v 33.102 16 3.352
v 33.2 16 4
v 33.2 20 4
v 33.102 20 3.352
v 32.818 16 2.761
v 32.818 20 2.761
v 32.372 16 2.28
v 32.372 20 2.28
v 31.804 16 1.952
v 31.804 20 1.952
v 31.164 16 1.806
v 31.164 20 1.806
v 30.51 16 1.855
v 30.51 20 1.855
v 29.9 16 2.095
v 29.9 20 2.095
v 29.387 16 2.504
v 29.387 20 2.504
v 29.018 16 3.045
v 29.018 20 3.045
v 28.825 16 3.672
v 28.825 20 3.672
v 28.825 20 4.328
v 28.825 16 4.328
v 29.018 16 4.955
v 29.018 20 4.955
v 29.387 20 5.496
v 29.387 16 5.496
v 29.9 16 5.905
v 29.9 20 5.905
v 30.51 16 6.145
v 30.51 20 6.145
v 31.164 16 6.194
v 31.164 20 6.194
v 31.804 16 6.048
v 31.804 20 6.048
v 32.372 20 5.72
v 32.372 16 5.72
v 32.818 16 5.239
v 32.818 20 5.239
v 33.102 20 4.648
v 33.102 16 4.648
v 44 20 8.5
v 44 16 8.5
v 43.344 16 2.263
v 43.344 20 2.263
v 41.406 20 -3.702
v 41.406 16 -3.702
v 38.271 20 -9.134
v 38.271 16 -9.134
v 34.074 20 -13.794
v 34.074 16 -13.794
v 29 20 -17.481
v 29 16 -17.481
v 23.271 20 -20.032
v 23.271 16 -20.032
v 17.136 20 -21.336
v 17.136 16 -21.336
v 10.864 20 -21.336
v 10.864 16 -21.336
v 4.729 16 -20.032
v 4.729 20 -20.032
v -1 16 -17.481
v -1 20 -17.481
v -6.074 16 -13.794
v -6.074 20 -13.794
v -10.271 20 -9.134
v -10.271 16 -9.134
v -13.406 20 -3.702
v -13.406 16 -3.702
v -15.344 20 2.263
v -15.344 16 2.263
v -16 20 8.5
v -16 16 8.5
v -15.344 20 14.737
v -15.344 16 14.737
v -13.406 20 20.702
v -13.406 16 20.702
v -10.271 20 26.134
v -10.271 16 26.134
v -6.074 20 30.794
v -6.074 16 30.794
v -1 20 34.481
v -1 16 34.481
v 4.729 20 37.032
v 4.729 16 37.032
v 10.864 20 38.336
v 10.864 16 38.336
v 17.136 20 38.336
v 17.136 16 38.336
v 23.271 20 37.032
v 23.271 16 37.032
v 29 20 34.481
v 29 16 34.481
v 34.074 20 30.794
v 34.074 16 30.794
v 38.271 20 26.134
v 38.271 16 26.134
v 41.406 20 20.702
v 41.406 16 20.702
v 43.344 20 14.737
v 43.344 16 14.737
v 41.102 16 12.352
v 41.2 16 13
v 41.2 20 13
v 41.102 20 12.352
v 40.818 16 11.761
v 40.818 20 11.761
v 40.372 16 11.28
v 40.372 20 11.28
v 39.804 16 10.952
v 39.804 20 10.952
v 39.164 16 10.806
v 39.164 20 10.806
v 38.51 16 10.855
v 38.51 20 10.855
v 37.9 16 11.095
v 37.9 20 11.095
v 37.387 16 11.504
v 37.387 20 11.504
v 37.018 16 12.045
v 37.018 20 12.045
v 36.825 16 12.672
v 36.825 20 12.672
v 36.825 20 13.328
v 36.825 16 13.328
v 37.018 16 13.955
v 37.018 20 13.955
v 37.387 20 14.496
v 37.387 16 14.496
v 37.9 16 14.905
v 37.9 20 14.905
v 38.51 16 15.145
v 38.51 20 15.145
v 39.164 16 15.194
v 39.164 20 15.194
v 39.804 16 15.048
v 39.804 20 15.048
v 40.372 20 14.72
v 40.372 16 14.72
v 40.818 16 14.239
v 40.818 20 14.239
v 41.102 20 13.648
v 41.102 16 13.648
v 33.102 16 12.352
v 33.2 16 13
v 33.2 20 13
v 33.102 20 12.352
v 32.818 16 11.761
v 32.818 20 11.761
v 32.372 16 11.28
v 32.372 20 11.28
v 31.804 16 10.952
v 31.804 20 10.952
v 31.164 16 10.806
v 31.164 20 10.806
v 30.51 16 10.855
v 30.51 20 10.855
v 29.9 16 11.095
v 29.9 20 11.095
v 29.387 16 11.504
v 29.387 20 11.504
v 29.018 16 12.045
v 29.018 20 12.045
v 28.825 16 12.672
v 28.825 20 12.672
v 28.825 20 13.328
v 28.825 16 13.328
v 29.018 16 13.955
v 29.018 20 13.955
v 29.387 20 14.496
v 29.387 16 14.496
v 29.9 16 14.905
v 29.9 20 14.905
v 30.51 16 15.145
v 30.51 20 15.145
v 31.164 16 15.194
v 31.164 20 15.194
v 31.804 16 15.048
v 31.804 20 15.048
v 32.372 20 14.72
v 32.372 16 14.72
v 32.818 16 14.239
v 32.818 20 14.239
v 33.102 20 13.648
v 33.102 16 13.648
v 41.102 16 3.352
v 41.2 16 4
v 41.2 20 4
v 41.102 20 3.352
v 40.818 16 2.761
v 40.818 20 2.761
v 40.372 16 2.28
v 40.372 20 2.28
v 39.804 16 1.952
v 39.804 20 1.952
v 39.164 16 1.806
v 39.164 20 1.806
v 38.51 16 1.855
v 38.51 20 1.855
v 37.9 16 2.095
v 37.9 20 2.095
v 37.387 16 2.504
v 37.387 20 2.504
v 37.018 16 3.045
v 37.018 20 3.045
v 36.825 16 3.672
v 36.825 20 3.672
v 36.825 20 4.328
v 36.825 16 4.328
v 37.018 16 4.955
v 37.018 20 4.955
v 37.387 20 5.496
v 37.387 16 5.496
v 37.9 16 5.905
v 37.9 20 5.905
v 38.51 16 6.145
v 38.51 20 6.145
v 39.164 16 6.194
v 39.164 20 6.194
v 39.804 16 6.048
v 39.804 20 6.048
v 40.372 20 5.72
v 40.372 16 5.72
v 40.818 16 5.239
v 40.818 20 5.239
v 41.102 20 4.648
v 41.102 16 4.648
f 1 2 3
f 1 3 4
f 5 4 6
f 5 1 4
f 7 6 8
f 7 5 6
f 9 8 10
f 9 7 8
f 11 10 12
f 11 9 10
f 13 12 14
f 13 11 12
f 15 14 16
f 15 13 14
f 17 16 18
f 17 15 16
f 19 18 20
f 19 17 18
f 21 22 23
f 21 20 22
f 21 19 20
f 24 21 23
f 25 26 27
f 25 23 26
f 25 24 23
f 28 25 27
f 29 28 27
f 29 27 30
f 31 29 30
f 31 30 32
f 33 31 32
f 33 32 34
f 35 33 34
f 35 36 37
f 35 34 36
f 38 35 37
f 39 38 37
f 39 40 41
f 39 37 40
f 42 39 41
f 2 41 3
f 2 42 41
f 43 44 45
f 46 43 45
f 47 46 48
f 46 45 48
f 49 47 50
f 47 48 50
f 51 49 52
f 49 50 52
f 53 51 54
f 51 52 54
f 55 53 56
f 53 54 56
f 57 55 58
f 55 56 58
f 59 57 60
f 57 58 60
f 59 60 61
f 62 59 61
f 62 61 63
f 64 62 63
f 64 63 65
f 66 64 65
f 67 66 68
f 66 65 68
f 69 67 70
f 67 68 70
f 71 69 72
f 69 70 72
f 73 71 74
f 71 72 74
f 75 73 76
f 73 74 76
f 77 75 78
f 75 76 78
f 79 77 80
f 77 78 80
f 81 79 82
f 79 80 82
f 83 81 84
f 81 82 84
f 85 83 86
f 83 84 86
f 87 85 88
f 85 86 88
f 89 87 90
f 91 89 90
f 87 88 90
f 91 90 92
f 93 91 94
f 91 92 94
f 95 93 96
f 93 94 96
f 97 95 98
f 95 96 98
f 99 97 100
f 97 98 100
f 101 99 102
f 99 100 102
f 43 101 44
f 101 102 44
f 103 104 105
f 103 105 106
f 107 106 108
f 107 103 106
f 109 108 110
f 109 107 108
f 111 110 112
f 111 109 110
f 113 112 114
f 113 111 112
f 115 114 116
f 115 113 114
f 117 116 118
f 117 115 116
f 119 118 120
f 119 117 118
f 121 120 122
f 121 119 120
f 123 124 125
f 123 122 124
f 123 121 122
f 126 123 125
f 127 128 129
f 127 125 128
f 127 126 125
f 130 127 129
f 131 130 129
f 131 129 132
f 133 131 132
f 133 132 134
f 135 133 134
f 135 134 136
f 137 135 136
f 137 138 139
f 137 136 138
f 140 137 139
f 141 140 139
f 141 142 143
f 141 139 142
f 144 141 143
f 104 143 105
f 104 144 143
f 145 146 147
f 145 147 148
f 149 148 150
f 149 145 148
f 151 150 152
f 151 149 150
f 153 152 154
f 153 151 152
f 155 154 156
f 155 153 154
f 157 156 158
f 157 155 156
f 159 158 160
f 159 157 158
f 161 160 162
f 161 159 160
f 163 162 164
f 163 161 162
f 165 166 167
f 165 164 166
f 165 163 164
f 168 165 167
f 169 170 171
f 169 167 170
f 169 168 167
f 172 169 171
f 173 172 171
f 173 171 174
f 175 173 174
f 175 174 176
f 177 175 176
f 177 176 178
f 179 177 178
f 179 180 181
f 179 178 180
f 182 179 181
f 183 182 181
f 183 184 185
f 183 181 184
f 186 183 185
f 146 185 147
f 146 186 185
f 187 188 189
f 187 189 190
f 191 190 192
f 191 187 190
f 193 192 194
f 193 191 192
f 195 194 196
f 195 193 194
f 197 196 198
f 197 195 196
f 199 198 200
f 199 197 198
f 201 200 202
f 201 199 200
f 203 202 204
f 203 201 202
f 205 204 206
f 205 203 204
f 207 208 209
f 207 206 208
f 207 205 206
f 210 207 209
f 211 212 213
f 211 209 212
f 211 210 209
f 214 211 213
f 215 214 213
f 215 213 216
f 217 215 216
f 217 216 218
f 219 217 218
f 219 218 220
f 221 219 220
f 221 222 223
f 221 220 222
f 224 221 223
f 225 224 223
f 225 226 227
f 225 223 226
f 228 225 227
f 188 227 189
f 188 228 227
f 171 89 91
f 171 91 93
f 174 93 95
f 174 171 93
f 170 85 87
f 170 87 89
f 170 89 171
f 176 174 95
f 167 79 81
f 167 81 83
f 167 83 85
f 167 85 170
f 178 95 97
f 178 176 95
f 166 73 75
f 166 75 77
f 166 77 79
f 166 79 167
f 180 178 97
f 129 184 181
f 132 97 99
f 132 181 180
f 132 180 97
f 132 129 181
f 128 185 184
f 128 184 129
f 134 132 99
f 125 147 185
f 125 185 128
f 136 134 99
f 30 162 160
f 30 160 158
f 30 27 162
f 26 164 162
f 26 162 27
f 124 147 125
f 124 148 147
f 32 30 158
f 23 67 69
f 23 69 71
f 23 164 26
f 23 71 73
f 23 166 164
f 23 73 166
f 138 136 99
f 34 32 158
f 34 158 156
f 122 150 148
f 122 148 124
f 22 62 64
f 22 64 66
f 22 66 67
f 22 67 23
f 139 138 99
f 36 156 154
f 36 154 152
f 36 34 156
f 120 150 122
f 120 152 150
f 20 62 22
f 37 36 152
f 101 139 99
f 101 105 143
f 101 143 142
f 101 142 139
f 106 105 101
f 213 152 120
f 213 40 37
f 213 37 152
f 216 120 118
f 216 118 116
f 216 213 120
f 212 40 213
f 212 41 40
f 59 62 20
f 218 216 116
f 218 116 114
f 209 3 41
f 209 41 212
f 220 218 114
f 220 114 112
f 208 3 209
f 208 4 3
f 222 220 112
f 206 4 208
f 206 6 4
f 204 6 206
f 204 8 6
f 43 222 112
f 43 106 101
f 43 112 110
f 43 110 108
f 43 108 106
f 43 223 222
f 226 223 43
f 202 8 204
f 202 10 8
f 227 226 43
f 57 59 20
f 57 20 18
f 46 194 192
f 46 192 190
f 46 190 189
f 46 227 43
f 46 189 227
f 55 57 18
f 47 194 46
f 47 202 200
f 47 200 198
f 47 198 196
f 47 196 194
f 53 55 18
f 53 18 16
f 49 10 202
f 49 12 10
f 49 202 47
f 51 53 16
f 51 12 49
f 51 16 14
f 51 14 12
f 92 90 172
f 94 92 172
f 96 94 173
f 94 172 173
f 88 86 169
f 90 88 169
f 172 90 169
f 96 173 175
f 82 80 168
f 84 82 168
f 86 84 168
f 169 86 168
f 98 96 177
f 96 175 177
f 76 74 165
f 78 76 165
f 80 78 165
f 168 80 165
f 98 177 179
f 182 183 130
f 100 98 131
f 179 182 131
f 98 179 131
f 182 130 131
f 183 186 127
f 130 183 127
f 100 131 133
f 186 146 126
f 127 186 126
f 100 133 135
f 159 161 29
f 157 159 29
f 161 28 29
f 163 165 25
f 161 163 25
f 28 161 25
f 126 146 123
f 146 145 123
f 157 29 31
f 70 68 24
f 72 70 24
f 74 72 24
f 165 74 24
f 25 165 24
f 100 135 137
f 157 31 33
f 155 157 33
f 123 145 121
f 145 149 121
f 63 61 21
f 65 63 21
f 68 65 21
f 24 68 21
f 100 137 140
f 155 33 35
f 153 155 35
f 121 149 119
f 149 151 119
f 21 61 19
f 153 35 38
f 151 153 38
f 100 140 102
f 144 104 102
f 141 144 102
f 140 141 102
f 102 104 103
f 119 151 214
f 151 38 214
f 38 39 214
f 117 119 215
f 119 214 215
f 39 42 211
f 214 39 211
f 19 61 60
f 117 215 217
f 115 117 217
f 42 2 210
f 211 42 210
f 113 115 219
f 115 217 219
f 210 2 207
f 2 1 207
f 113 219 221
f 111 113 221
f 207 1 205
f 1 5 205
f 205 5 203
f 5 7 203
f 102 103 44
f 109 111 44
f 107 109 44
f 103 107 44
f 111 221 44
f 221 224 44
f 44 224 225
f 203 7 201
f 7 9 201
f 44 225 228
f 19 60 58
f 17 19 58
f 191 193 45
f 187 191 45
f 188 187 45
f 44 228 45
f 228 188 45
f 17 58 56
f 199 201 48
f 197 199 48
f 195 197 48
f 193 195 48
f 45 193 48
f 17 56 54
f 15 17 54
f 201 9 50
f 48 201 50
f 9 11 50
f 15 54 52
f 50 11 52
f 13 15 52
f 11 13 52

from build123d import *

# Parameters (mm, degrees)
CYLINDER019_R          = 2.2
CYLINDER019_DEPTH      = 26
CYLINDER019_ROLL_ANGLE = -90
ARRAY005_X_COUNT       = 2
ARRAY005_X_PITCH       = 8
ARRAY005_Z_COUNT       = 2
ARRAY005_Z_PITCH       = 9
CYLINDER018_R          = 30
CYLINDER018_DEPTH      = 4
CYLINDER018_ROLL_ANGLE = -90


with BuildPart() as taladros_suje_traccion003:
    # Cylinder019 → Cylinder019 (new body)
    with BuildSketch(Plane.XY):
        Circle(CYLINDER019_R)
    extrude(amount=CYLINDER019_DEPTH)


with BuildPart() as taladros_suje_traccion003_1:
    # Cylinder019 roll: moved
    add(taladros_suje_traccion003.part.rotate(Axis((0, 0, 0), (1, 0, 0)), CYLINDER019_ROLL_ANGLE))


with BuildPart() as taladros_suje_traccion003_2:
    # Cylinder019 placement: moved
    add(taladros_suje_traccion003_1.part.moved(Location((202, 0, 4))))

    # Array005 X: Taladros_suje_traccion003 ×2


with BuildPart() as taladros_suje_traccion003_3:
    add(taladros_suje_traccion003_2.part)
    with Locations(*[(i * ARRAY005_X_PITCH, 0, 0) for i in range(1, ARRAY005_X_COUNT)]):
        add(taladros_suje_traccion003_2.part)

    # Array005 Z: Taladros_suje_traccion003 ×2


with BuildPart() as taladros_suje_traccion003_4:
    add(taladros_suje_traccion003_3.part)
    with Locations(*[(0, 0, i * ARRAY005_Z_PITCH) for i in range(1, ARRAY005_Z_COUNT)]):
        add(taladros_suje_traccion003_3.part)


with BuildPart() as traccion001:
    # Cylinder018 → Cylinder018 (new body)
    with BuildSketch(Plane.XY):
        Circle(CYLINDER018_R)
    extrude(amount=CYLINDER018_DEPTH)


with BuildPart() as traccion001_1:
    # Cylinder018 roll: moved
    add(traccion001.part.rotate(Axis((0, 0, 0), (1, 0, 0)), CYLINDER018_ROLL_ANGLE))


with BuildPart() as traccion001_2:
    # Cylinder018 placement: moved
    add(traccion001_1.part.moved(Location((185, 20, 8.5))))

    # Cut015: cut Taladros_suje_traccion003
    add(taladros_suje_traccion003_4.part, mode=Mode.SUBTRACT)


with BuildPart() as traccion001_3:
    # Cut015 placement: moved
    add(traccion001_2.part.moved(Location((-171, -4, 0))))


solid = traccion001_3.part
